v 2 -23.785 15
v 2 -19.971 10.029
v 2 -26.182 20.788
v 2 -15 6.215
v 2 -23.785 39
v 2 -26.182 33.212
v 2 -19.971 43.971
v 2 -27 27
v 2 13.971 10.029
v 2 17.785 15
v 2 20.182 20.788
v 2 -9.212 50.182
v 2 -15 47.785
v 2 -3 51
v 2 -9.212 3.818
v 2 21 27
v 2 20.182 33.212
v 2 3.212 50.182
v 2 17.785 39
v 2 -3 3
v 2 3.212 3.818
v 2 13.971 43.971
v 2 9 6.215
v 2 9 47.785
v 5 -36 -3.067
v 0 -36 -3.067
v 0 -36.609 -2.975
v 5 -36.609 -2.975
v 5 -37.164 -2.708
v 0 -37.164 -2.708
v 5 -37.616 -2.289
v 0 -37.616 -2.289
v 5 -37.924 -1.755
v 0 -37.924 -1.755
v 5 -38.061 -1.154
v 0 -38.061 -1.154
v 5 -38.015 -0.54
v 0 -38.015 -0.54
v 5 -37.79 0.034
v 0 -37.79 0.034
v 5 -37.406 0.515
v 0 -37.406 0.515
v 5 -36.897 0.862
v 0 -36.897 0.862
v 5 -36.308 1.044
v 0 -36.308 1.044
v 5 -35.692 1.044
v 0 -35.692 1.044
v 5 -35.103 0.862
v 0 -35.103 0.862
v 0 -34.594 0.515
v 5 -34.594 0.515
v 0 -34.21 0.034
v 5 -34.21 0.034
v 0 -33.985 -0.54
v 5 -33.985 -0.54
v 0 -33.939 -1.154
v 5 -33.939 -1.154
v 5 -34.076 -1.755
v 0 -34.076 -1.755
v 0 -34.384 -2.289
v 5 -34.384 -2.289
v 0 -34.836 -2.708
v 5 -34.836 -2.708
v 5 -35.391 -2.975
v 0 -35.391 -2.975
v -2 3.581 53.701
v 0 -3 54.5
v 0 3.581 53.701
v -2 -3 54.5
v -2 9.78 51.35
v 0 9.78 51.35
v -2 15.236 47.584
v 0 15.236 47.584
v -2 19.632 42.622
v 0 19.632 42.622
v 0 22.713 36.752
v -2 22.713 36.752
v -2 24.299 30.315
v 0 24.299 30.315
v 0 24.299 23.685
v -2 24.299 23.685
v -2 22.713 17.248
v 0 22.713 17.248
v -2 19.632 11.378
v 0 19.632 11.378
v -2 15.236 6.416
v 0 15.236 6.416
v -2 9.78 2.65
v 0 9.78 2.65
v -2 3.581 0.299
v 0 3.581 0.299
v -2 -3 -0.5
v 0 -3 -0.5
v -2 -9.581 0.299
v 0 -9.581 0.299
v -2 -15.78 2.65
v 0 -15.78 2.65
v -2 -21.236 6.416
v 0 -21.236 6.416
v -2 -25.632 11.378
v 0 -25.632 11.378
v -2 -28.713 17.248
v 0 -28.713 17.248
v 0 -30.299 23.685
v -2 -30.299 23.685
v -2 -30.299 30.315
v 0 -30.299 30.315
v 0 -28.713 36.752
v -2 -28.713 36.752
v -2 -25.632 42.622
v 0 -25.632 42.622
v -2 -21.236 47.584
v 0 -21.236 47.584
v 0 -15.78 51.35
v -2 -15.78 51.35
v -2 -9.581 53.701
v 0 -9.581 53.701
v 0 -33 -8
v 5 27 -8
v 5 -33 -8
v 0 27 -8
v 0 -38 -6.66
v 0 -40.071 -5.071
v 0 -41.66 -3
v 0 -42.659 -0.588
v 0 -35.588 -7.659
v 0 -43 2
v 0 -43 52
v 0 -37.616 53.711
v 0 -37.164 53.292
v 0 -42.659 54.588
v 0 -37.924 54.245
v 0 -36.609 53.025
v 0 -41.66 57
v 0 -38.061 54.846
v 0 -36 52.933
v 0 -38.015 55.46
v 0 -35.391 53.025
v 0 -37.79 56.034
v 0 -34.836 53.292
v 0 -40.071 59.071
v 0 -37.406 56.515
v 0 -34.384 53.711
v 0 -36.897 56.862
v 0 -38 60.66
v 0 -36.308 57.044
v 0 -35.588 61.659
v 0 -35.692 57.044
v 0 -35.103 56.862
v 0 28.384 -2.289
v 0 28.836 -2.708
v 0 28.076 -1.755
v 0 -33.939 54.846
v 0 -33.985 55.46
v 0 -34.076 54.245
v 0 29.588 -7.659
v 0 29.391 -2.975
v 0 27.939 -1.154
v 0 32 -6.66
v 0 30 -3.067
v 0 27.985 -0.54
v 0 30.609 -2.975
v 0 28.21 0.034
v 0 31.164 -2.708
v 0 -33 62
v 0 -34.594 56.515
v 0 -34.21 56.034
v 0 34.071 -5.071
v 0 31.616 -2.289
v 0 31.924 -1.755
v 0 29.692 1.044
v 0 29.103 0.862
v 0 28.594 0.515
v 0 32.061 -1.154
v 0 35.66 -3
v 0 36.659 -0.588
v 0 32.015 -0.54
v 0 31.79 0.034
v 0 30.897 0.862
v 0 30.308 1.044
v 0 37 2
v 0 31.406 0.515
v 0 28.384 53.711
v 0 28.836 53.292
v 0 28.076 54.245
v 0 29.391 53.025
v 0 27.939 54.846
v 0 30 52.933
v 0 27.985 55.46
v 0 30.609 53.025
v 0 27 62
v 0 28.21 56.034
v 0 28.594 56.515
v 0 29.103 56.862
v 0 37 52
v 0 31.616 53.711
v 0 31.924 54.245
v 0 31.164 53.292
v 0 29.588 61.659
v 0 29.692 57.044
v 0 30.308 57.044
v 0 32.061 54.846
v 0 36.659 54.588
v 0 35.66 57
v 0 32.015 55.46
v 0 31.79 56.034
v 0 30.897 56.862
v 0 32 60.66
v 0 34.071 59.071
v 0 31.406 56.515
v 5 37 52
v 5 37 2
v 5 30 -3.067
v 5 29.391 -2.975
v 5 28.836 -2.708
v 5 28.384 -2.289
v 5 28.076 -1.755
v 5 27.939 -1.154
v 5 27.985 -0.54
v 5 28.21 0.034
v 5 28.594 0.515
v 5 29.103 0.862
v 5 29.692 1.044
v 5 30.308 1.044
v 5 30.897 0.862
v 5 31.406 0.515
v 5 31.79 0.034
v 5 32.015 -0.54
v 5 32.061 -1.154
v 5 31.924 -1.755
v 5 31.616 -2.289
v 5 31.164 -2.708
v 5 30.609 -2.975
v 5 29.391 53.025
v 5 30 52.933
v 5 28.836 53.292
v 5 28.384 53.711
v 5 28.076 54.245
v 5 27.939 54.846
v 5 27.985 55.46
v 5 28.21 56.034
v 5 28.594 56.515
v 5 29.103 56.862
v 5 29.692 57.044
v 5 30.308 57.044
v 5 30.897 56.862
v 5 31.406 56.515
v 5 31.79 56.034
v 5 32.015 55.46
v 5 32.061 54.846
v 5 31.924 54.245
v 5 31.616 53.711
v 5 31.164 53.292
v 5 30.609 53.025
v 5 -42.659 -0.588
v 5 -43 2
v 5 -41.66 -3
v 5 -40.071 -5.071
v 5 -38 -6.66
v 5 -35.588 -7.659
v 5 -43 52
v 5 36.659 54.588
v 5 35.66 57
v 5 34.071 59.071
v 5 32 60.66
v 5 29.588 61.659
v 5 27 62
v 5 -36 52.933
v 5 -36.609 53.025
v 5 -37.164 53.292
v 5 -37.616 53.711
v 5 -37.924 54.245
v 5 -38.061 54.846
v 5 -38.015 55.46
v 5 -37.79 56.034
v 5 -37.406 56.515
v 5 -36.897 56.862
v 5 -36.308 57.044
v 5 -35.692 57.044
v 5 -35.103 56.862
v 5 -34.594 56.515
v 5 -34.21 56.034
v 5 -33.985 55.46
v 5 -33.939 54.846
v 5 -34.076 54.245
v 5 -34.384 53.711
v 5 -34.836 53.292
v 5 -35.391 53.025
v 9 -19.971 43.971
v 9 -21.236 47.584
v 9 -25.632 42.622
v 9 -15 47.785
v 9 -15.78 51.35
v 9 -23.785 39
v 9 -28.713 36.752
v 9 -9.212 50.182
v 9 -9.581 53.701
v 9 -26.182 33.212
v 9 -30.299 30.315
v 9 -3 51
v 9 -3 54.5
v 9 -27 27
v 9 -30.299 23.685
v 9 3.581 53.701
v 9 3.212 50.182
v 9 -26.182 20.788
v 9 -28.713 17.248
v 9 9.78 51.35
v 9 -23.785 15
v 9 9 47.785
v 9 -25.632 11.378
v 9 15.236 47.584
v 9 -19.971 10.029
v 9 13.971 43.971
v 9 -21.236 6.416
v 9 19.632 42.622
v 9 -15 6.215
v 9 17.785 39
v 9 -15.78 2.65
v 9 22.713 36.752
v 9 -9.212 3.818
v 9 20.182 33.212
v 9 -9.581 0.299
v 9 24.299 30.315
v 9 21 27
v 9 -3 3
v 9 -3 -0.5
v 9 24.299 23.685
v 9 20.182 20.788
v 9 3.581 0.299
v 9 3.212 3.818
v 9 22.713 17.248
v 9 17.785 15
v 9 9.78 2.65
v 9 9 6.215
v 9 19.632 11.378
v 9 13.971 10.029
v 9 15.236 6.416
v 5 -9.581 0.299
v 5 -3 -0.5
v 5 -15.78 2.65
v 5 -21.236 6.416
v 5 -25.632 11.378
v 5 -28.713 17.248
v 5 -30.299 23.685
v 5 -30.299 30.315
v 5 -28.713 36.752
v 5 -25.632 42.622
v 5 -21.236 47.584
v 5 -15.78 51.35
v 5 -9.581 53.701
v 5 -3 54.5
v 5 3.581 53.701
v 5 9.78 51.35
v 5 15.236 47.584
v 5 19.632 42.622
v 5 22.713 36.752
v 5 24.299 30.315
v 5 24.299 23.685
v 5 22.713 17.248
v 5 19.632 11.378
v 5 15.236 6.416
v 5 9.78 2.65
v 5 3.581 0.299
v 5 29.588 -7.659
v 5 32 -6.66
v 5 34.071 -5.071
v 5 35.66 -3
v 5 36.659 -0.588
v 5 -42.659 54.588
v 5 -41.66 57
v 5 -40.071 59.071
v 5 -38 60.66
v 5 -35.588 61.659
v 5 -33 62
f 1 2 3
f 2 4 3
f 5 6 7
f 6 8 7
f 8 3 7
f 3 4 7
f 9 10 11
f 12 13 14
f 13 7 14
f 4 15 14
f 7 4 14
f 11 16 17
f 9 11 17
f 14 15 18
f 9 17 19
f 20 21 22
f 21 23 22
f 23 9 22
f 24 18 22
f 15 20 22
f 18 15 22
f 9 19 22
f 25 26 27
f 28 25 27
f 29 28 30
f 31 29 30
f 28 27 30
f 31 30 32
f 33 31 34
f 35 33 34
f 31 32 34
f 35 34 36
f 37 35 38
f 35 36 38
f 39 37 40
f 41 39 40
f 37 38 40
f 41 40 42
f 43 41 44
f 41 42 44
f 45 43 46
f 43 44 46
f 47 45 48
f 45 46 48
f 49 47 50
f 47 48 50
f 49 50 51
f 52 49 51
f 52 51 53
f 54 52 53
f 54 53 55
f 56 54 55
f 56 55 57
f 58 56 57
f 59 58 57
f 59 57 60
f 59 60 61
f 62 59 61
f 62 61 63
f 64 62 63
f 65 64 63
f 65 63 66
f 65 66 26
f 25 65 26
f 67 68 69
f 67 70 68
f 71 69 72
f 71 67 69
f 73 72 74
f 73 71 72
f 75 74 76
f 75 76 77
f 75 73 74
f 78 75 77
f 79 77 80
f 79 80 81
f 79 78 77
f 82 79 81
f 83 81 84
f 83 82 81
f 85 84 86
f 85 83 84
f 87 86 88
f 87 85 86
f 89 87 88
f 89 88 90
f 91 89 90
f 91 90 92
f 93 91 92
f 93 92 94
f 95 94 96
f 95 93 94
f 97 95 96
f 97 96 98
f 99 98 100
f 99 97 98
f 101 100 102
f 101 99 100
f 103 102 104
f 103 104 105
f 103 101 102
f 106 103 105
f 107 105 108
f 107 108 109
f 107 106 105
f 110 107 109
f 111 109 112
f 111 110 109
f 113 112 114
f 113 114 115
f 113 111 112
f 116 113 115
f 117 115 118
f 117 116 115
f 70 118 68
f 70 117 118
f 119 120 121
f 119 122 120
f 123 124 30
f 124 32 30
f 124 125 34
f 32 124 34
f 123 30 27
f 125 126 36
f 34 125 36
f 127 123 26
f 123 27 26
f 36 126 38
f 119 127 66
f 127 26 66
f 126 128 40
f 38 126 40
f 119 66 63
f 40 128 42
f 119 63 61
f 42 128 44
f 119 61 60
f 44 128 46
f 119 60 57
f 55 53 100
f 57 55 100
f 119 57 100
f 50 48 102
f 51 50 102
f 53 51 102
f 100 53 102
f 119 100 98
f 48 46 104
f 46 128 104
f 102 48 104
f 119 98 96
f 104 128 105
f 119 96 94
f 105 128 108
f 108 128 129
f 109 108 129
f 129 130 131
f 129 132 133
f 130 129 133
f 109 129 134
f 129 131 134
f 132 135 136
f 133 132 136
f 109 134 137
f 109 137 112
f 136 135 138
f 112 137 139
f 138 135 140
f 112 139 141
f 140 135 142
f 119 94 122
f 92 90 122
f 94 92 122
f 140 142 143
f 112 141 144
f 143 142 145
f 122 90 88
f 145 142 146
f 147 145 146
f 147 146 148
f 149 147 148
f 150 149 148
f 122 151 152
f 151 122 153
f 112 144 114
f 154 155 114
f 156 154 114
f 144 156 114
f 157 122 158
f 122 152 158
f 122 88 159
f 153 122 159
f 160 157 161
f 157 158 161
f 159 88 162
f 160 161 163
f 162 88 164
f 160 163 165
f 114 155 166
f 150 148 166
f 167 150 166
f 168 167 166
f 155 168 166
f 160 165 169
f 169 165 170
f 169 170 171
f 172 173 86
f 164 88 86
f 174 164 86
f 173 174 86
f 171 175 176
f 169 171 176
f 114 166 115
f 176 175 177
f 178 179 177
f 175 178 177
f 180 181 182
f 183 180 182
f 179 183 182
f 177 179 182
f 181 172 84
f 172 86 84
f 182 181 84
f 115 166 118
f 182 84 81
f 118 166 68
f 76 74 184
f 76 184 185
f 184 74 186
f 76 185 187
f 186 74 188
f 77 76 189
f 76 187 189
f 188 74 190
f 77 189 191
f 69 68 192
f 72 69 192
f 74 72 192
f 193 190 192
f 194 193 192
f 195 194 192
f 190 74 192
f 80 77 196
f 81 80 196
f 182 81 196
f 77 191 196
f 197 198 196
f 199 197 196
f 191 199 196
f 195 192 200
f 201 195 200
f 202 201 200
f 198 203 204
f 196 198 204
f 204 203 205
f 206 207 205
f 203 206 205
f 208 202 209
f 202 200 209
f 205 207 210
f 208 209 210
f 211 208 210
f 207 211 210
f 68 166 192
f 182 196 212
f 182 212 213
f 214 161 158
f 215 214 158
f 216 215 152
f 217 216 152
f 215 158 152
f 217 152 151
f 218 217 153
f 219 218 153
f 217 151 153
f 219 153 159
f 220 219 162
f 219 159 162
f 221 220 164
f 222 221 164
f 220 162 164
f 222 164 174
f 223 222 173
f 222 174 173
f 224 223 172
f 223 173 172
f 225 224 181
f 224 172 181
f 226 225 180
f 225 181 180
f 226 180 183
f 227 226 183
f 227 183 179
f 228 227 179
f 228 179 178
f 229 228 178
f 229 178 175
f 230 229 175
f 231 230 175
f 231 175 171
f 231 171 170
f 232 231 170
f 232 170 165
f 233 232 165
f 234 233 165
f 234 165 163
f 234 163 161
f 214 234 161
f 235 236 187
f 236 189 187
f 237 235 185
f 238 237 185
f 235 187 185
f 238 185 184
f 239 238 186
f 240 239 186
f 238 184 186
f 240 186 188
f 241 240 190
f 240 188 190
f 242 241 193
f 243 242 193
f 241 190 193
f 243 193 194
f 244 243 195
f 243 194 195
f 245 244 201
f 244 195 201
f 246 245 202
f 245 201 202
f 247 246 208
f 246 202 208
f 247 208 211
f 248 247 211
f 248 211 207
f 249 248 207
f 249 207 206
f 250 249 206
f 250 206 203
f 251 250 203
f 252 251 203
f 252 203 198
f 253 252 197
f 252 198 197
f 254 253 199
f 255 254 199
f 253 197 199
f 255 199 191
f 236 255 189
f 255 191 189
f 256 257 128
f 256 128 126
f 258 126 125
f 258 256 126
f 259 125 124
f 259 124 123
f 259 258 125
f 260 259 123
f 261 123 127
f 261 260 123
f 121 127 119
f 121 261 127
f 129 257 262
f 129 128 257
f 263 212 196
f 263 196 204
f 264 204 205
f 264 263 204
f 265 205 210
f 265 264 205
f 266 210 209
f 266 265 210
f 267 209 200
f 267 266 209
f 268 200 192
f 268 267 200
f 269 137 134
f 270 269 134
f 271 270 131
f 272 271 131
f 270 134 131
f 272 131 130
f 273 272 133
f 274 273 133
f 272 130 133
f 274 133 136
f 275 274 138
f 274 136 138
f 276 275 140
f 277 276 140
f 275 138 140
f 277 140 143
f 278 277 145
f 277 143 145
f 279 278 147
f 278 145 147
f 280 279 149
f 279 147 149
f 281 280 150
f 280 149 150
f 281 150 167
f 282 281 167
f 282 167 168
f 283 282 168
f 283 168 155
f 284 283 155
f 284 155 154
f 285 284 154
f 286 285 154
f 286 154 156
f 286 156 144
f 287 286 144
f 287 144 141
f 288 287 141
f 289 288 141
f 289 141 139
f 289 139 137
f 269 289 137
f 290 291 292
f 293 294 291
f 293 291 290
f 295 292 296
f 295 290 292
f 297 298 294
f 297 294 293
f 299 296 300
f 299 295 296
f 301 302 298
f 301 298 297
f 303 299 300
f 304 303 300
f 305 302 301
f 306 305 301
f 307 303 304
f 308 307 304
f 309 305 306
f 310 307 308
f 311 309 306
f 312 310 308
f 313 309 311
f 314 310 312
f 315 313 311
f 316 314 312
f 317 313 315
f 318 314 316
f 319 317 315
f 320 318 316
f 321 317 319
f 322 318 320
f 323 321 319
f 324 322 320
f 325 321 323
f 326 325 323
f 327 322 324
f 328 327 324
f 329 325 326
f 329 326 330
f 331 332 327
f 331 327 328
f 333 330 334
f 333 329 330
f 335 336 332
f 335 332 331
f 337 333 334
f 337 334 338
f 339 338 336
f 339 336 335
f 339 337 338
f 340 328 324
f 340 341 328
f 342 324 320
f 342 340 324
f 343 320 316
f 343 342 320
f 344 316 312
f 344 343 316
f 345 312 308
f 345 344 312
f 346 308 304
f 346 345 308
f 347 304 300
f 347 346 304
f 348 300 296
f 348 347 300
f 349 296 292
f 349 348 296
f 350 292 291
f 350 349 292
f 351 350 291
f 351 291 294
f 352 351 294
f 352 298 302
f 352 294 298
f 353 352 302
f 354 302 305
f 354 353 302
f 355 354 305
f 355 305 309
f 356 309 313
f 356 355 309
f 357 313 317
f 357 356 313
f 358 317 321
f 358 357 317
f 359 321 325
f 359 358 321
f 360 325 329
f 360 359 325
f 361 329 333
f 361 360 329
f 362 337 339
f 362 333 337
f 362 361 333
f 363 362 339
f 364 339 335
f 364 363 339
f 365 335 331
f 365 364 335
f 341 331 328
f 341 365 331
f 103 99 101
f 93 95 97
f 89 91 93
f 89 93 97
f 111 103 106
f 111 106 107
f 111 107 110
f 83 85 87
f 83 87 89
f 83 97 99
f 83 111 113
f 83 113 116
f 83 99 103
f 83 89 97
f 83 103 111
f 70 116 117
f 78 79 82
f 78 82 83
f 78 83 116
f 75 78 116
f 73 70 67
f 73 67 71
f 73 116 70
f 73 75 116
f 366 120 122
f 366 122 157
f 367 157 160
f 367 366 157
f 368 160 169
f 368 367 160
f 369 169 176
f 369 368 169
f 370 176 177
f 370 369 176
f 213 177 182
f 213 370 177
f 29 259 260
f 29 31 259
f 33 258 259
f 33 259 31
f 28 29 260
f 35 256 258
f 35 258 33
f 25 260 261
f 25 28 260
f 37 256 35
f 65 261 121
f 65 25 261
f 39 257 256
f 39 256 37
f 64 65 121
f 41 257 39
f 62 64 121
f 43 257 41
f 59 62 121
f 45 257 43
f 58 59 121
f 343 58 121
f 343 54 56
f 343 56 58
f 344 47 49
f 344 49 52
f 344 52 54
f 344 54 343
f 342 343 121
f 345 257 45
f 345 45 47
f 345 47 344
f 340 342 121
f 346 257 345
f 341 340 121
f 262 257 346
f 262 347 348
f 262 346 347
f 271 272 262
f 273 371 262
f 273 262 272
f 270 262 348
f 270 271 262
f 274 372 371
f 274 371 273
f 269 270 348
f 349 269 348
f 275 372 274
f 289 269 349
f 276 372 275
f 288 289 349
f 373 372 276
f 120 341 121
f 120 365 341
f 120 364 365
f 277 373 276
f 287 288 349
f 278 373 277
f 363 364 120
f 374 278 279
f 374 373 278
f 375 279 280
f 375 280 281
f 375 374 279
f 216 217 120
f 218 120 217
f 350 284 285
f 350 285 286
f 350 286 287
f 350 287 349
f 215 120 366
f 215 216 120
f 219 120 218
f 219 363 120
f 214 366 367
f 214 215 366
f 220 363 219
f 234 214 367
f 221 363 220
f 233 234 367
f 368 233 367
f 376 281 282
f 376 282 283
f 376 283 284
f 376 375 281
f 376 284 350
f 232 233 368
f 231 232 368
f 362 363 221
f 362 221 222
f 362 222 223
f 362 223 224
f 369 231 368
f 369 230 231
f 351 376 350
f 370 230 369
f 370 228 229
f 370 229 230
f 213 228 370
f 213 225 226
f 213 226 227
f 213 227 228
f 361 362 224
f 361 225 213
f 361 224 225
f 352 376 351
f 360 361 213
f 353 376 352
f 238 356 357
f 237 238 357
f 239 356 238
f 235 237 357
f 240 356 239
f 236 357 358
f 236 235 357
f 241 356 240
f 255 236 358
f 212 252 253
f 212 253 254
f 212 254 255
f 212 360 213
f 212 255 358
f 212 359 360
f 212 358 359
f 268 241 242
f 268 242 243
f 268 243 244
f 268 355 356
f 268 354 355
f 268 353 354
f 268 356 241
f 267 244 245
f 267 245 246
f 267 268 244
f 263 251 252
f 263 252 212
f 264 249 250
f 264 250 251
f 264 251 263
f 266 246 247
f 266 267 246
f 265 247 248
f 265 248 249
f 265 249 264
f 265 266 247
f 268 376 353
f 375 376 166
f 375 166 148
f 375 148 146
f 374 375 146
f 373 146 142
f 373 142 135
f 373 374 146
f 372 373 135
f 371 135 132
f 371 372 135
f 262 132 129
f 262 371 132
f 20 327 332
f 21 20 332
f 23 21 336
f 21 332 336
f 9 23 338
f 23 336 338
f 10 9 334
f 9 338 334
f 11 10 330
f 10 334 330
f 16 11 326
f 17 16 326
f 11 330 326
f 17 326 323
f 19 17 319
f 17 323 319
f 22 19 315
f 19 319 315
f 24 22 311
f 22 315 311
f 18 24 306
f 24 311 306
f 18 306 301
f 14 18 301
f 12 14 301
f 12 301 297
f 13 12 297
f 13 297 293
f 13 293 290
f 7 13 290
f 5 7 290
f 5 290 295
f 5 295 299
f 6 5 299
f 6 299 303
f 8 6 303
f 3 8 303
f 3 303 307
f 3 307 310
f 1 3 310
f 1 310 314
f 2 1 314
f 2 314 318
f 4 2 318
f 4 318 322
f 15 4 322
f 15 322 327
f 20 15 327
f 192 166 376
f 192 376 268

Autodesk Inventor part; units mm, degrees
ref_plane "YZ Plane" through (0, 0, 0) normal (1, 0, 0) x (0, 1, 0)
ref_plane "XZ Plane" through (0, 0, 0) normal (0, 1, 0) x (-1, 0, 0)
ref_plane "XY Plane" through (0, 0, 0) normal (0, 0, 1) x (1, 0, 0)
sketch "Skizze1" plane through (0, 0, 0) normal (1, 0, 0) x (0, 1, 0)
  line L0 (-43, 62) -> (37, 62)
  line L1 (37, 62) -> (37, -8)
  line L2 (37, -8) -> (-43, -8)
  line L3 (-43, -8) -> (-43, 62)
  line L4 (-43, 62) -> (37, -8) construction
  line L5 (37, 62) -> (-43, -8) construction
  point P0 (-3, 27)
  dimension "d3" = 80
  dimension "d4" = 70
extrude "Extrusion1" add sketch "Skizze1" along normal blind 5
sketch "Skizze2" plane through (5, 0, 0) normal (1, 0, 0) x (0, 0, -1)
  circle A0 centre (-27, -3) radius 27.5
  line L0 (8, 37) -> (-62, 37) projected
  line L1 (-62, 37) -> (-62, -43) projected
  point P0 (0, 0)
  dimension "d5" = 55
  dimension "d11" = 40
  dimension "d12" = 35
extrude "Extrusion2" add sketch "Skizze2" along normal blind 4
sketch "Skizze3" plane through (9, -3, 27) normal (1, 0, 0) x (0, 0, -1)
  circle A0 centre (0, 0) radius 24
  point P0 (27, 3)
  dimension "d8" = 48
extrude "Extrusion3" cut sketch "Skizze3" against normal through all
fillet "Rundung1" radius 10 4 edges at (2.5, 37, -8) (2.5, 37, 62) (2.5, -43, 62) (2.5, -43, -8)
sketch "Skizze4" plane through (5, 0, 0) normal (1, 0, 0) x (0, 0, -1)
  circle A0 centre (-27, -3) radius 33.55
  line L0 (-2, 37) -> (-52, 37) projected
  line L1 (-62, 27) -> (-62, -33) projected
  line L2 (8, -33) -> (8, 27) projected
  line L3 (-52, -43) -> (-2, -43) projected
  point P0 (0, 0)
  point P1 (-55, 30)
  point P2 (1, 30)
  point P3 (1, -36)
  point P4 (-55, -36)
  dimension "d14" = 67.1
  dimension "d15" = 7
  dimension "d16" = 7
  dimension "d17" = 7
  dimension "d18" = 7
  dimension "d19" = 7
  dimension "d20" = 7
  dimension "d21" = 7
  dimension "d29" = 7
hole "Bohrung1" at (5, 30, 55) at (5, 30, -1) at (5, -36, -1) at (5, -36, 55) direction (-1, 0, 0) diameter 4.134 end through all thread size "M5x0.8" class "6H" standard "ANSI Metric M Profile"
sketch "Skizze5" plane through (0, 0, 0) normal (-1, 0, 0) x (0, 0, 1)
  circle A0 centre (27, -3) radius 24 projected
  circle A1 centre (27, -3) radius 27.5
  circle A2 centre (27, -3) radius 10
  point P0 (0, 0)
  dimension "d30" = 55
  dimension "d39" = 20
extrude "Extrusion5" add sketch "Skizze5" along normal mid plane 4 contours A0 | A1 | A2
properties part number "Deckel Endewelle" material "Aluminium 6061"
